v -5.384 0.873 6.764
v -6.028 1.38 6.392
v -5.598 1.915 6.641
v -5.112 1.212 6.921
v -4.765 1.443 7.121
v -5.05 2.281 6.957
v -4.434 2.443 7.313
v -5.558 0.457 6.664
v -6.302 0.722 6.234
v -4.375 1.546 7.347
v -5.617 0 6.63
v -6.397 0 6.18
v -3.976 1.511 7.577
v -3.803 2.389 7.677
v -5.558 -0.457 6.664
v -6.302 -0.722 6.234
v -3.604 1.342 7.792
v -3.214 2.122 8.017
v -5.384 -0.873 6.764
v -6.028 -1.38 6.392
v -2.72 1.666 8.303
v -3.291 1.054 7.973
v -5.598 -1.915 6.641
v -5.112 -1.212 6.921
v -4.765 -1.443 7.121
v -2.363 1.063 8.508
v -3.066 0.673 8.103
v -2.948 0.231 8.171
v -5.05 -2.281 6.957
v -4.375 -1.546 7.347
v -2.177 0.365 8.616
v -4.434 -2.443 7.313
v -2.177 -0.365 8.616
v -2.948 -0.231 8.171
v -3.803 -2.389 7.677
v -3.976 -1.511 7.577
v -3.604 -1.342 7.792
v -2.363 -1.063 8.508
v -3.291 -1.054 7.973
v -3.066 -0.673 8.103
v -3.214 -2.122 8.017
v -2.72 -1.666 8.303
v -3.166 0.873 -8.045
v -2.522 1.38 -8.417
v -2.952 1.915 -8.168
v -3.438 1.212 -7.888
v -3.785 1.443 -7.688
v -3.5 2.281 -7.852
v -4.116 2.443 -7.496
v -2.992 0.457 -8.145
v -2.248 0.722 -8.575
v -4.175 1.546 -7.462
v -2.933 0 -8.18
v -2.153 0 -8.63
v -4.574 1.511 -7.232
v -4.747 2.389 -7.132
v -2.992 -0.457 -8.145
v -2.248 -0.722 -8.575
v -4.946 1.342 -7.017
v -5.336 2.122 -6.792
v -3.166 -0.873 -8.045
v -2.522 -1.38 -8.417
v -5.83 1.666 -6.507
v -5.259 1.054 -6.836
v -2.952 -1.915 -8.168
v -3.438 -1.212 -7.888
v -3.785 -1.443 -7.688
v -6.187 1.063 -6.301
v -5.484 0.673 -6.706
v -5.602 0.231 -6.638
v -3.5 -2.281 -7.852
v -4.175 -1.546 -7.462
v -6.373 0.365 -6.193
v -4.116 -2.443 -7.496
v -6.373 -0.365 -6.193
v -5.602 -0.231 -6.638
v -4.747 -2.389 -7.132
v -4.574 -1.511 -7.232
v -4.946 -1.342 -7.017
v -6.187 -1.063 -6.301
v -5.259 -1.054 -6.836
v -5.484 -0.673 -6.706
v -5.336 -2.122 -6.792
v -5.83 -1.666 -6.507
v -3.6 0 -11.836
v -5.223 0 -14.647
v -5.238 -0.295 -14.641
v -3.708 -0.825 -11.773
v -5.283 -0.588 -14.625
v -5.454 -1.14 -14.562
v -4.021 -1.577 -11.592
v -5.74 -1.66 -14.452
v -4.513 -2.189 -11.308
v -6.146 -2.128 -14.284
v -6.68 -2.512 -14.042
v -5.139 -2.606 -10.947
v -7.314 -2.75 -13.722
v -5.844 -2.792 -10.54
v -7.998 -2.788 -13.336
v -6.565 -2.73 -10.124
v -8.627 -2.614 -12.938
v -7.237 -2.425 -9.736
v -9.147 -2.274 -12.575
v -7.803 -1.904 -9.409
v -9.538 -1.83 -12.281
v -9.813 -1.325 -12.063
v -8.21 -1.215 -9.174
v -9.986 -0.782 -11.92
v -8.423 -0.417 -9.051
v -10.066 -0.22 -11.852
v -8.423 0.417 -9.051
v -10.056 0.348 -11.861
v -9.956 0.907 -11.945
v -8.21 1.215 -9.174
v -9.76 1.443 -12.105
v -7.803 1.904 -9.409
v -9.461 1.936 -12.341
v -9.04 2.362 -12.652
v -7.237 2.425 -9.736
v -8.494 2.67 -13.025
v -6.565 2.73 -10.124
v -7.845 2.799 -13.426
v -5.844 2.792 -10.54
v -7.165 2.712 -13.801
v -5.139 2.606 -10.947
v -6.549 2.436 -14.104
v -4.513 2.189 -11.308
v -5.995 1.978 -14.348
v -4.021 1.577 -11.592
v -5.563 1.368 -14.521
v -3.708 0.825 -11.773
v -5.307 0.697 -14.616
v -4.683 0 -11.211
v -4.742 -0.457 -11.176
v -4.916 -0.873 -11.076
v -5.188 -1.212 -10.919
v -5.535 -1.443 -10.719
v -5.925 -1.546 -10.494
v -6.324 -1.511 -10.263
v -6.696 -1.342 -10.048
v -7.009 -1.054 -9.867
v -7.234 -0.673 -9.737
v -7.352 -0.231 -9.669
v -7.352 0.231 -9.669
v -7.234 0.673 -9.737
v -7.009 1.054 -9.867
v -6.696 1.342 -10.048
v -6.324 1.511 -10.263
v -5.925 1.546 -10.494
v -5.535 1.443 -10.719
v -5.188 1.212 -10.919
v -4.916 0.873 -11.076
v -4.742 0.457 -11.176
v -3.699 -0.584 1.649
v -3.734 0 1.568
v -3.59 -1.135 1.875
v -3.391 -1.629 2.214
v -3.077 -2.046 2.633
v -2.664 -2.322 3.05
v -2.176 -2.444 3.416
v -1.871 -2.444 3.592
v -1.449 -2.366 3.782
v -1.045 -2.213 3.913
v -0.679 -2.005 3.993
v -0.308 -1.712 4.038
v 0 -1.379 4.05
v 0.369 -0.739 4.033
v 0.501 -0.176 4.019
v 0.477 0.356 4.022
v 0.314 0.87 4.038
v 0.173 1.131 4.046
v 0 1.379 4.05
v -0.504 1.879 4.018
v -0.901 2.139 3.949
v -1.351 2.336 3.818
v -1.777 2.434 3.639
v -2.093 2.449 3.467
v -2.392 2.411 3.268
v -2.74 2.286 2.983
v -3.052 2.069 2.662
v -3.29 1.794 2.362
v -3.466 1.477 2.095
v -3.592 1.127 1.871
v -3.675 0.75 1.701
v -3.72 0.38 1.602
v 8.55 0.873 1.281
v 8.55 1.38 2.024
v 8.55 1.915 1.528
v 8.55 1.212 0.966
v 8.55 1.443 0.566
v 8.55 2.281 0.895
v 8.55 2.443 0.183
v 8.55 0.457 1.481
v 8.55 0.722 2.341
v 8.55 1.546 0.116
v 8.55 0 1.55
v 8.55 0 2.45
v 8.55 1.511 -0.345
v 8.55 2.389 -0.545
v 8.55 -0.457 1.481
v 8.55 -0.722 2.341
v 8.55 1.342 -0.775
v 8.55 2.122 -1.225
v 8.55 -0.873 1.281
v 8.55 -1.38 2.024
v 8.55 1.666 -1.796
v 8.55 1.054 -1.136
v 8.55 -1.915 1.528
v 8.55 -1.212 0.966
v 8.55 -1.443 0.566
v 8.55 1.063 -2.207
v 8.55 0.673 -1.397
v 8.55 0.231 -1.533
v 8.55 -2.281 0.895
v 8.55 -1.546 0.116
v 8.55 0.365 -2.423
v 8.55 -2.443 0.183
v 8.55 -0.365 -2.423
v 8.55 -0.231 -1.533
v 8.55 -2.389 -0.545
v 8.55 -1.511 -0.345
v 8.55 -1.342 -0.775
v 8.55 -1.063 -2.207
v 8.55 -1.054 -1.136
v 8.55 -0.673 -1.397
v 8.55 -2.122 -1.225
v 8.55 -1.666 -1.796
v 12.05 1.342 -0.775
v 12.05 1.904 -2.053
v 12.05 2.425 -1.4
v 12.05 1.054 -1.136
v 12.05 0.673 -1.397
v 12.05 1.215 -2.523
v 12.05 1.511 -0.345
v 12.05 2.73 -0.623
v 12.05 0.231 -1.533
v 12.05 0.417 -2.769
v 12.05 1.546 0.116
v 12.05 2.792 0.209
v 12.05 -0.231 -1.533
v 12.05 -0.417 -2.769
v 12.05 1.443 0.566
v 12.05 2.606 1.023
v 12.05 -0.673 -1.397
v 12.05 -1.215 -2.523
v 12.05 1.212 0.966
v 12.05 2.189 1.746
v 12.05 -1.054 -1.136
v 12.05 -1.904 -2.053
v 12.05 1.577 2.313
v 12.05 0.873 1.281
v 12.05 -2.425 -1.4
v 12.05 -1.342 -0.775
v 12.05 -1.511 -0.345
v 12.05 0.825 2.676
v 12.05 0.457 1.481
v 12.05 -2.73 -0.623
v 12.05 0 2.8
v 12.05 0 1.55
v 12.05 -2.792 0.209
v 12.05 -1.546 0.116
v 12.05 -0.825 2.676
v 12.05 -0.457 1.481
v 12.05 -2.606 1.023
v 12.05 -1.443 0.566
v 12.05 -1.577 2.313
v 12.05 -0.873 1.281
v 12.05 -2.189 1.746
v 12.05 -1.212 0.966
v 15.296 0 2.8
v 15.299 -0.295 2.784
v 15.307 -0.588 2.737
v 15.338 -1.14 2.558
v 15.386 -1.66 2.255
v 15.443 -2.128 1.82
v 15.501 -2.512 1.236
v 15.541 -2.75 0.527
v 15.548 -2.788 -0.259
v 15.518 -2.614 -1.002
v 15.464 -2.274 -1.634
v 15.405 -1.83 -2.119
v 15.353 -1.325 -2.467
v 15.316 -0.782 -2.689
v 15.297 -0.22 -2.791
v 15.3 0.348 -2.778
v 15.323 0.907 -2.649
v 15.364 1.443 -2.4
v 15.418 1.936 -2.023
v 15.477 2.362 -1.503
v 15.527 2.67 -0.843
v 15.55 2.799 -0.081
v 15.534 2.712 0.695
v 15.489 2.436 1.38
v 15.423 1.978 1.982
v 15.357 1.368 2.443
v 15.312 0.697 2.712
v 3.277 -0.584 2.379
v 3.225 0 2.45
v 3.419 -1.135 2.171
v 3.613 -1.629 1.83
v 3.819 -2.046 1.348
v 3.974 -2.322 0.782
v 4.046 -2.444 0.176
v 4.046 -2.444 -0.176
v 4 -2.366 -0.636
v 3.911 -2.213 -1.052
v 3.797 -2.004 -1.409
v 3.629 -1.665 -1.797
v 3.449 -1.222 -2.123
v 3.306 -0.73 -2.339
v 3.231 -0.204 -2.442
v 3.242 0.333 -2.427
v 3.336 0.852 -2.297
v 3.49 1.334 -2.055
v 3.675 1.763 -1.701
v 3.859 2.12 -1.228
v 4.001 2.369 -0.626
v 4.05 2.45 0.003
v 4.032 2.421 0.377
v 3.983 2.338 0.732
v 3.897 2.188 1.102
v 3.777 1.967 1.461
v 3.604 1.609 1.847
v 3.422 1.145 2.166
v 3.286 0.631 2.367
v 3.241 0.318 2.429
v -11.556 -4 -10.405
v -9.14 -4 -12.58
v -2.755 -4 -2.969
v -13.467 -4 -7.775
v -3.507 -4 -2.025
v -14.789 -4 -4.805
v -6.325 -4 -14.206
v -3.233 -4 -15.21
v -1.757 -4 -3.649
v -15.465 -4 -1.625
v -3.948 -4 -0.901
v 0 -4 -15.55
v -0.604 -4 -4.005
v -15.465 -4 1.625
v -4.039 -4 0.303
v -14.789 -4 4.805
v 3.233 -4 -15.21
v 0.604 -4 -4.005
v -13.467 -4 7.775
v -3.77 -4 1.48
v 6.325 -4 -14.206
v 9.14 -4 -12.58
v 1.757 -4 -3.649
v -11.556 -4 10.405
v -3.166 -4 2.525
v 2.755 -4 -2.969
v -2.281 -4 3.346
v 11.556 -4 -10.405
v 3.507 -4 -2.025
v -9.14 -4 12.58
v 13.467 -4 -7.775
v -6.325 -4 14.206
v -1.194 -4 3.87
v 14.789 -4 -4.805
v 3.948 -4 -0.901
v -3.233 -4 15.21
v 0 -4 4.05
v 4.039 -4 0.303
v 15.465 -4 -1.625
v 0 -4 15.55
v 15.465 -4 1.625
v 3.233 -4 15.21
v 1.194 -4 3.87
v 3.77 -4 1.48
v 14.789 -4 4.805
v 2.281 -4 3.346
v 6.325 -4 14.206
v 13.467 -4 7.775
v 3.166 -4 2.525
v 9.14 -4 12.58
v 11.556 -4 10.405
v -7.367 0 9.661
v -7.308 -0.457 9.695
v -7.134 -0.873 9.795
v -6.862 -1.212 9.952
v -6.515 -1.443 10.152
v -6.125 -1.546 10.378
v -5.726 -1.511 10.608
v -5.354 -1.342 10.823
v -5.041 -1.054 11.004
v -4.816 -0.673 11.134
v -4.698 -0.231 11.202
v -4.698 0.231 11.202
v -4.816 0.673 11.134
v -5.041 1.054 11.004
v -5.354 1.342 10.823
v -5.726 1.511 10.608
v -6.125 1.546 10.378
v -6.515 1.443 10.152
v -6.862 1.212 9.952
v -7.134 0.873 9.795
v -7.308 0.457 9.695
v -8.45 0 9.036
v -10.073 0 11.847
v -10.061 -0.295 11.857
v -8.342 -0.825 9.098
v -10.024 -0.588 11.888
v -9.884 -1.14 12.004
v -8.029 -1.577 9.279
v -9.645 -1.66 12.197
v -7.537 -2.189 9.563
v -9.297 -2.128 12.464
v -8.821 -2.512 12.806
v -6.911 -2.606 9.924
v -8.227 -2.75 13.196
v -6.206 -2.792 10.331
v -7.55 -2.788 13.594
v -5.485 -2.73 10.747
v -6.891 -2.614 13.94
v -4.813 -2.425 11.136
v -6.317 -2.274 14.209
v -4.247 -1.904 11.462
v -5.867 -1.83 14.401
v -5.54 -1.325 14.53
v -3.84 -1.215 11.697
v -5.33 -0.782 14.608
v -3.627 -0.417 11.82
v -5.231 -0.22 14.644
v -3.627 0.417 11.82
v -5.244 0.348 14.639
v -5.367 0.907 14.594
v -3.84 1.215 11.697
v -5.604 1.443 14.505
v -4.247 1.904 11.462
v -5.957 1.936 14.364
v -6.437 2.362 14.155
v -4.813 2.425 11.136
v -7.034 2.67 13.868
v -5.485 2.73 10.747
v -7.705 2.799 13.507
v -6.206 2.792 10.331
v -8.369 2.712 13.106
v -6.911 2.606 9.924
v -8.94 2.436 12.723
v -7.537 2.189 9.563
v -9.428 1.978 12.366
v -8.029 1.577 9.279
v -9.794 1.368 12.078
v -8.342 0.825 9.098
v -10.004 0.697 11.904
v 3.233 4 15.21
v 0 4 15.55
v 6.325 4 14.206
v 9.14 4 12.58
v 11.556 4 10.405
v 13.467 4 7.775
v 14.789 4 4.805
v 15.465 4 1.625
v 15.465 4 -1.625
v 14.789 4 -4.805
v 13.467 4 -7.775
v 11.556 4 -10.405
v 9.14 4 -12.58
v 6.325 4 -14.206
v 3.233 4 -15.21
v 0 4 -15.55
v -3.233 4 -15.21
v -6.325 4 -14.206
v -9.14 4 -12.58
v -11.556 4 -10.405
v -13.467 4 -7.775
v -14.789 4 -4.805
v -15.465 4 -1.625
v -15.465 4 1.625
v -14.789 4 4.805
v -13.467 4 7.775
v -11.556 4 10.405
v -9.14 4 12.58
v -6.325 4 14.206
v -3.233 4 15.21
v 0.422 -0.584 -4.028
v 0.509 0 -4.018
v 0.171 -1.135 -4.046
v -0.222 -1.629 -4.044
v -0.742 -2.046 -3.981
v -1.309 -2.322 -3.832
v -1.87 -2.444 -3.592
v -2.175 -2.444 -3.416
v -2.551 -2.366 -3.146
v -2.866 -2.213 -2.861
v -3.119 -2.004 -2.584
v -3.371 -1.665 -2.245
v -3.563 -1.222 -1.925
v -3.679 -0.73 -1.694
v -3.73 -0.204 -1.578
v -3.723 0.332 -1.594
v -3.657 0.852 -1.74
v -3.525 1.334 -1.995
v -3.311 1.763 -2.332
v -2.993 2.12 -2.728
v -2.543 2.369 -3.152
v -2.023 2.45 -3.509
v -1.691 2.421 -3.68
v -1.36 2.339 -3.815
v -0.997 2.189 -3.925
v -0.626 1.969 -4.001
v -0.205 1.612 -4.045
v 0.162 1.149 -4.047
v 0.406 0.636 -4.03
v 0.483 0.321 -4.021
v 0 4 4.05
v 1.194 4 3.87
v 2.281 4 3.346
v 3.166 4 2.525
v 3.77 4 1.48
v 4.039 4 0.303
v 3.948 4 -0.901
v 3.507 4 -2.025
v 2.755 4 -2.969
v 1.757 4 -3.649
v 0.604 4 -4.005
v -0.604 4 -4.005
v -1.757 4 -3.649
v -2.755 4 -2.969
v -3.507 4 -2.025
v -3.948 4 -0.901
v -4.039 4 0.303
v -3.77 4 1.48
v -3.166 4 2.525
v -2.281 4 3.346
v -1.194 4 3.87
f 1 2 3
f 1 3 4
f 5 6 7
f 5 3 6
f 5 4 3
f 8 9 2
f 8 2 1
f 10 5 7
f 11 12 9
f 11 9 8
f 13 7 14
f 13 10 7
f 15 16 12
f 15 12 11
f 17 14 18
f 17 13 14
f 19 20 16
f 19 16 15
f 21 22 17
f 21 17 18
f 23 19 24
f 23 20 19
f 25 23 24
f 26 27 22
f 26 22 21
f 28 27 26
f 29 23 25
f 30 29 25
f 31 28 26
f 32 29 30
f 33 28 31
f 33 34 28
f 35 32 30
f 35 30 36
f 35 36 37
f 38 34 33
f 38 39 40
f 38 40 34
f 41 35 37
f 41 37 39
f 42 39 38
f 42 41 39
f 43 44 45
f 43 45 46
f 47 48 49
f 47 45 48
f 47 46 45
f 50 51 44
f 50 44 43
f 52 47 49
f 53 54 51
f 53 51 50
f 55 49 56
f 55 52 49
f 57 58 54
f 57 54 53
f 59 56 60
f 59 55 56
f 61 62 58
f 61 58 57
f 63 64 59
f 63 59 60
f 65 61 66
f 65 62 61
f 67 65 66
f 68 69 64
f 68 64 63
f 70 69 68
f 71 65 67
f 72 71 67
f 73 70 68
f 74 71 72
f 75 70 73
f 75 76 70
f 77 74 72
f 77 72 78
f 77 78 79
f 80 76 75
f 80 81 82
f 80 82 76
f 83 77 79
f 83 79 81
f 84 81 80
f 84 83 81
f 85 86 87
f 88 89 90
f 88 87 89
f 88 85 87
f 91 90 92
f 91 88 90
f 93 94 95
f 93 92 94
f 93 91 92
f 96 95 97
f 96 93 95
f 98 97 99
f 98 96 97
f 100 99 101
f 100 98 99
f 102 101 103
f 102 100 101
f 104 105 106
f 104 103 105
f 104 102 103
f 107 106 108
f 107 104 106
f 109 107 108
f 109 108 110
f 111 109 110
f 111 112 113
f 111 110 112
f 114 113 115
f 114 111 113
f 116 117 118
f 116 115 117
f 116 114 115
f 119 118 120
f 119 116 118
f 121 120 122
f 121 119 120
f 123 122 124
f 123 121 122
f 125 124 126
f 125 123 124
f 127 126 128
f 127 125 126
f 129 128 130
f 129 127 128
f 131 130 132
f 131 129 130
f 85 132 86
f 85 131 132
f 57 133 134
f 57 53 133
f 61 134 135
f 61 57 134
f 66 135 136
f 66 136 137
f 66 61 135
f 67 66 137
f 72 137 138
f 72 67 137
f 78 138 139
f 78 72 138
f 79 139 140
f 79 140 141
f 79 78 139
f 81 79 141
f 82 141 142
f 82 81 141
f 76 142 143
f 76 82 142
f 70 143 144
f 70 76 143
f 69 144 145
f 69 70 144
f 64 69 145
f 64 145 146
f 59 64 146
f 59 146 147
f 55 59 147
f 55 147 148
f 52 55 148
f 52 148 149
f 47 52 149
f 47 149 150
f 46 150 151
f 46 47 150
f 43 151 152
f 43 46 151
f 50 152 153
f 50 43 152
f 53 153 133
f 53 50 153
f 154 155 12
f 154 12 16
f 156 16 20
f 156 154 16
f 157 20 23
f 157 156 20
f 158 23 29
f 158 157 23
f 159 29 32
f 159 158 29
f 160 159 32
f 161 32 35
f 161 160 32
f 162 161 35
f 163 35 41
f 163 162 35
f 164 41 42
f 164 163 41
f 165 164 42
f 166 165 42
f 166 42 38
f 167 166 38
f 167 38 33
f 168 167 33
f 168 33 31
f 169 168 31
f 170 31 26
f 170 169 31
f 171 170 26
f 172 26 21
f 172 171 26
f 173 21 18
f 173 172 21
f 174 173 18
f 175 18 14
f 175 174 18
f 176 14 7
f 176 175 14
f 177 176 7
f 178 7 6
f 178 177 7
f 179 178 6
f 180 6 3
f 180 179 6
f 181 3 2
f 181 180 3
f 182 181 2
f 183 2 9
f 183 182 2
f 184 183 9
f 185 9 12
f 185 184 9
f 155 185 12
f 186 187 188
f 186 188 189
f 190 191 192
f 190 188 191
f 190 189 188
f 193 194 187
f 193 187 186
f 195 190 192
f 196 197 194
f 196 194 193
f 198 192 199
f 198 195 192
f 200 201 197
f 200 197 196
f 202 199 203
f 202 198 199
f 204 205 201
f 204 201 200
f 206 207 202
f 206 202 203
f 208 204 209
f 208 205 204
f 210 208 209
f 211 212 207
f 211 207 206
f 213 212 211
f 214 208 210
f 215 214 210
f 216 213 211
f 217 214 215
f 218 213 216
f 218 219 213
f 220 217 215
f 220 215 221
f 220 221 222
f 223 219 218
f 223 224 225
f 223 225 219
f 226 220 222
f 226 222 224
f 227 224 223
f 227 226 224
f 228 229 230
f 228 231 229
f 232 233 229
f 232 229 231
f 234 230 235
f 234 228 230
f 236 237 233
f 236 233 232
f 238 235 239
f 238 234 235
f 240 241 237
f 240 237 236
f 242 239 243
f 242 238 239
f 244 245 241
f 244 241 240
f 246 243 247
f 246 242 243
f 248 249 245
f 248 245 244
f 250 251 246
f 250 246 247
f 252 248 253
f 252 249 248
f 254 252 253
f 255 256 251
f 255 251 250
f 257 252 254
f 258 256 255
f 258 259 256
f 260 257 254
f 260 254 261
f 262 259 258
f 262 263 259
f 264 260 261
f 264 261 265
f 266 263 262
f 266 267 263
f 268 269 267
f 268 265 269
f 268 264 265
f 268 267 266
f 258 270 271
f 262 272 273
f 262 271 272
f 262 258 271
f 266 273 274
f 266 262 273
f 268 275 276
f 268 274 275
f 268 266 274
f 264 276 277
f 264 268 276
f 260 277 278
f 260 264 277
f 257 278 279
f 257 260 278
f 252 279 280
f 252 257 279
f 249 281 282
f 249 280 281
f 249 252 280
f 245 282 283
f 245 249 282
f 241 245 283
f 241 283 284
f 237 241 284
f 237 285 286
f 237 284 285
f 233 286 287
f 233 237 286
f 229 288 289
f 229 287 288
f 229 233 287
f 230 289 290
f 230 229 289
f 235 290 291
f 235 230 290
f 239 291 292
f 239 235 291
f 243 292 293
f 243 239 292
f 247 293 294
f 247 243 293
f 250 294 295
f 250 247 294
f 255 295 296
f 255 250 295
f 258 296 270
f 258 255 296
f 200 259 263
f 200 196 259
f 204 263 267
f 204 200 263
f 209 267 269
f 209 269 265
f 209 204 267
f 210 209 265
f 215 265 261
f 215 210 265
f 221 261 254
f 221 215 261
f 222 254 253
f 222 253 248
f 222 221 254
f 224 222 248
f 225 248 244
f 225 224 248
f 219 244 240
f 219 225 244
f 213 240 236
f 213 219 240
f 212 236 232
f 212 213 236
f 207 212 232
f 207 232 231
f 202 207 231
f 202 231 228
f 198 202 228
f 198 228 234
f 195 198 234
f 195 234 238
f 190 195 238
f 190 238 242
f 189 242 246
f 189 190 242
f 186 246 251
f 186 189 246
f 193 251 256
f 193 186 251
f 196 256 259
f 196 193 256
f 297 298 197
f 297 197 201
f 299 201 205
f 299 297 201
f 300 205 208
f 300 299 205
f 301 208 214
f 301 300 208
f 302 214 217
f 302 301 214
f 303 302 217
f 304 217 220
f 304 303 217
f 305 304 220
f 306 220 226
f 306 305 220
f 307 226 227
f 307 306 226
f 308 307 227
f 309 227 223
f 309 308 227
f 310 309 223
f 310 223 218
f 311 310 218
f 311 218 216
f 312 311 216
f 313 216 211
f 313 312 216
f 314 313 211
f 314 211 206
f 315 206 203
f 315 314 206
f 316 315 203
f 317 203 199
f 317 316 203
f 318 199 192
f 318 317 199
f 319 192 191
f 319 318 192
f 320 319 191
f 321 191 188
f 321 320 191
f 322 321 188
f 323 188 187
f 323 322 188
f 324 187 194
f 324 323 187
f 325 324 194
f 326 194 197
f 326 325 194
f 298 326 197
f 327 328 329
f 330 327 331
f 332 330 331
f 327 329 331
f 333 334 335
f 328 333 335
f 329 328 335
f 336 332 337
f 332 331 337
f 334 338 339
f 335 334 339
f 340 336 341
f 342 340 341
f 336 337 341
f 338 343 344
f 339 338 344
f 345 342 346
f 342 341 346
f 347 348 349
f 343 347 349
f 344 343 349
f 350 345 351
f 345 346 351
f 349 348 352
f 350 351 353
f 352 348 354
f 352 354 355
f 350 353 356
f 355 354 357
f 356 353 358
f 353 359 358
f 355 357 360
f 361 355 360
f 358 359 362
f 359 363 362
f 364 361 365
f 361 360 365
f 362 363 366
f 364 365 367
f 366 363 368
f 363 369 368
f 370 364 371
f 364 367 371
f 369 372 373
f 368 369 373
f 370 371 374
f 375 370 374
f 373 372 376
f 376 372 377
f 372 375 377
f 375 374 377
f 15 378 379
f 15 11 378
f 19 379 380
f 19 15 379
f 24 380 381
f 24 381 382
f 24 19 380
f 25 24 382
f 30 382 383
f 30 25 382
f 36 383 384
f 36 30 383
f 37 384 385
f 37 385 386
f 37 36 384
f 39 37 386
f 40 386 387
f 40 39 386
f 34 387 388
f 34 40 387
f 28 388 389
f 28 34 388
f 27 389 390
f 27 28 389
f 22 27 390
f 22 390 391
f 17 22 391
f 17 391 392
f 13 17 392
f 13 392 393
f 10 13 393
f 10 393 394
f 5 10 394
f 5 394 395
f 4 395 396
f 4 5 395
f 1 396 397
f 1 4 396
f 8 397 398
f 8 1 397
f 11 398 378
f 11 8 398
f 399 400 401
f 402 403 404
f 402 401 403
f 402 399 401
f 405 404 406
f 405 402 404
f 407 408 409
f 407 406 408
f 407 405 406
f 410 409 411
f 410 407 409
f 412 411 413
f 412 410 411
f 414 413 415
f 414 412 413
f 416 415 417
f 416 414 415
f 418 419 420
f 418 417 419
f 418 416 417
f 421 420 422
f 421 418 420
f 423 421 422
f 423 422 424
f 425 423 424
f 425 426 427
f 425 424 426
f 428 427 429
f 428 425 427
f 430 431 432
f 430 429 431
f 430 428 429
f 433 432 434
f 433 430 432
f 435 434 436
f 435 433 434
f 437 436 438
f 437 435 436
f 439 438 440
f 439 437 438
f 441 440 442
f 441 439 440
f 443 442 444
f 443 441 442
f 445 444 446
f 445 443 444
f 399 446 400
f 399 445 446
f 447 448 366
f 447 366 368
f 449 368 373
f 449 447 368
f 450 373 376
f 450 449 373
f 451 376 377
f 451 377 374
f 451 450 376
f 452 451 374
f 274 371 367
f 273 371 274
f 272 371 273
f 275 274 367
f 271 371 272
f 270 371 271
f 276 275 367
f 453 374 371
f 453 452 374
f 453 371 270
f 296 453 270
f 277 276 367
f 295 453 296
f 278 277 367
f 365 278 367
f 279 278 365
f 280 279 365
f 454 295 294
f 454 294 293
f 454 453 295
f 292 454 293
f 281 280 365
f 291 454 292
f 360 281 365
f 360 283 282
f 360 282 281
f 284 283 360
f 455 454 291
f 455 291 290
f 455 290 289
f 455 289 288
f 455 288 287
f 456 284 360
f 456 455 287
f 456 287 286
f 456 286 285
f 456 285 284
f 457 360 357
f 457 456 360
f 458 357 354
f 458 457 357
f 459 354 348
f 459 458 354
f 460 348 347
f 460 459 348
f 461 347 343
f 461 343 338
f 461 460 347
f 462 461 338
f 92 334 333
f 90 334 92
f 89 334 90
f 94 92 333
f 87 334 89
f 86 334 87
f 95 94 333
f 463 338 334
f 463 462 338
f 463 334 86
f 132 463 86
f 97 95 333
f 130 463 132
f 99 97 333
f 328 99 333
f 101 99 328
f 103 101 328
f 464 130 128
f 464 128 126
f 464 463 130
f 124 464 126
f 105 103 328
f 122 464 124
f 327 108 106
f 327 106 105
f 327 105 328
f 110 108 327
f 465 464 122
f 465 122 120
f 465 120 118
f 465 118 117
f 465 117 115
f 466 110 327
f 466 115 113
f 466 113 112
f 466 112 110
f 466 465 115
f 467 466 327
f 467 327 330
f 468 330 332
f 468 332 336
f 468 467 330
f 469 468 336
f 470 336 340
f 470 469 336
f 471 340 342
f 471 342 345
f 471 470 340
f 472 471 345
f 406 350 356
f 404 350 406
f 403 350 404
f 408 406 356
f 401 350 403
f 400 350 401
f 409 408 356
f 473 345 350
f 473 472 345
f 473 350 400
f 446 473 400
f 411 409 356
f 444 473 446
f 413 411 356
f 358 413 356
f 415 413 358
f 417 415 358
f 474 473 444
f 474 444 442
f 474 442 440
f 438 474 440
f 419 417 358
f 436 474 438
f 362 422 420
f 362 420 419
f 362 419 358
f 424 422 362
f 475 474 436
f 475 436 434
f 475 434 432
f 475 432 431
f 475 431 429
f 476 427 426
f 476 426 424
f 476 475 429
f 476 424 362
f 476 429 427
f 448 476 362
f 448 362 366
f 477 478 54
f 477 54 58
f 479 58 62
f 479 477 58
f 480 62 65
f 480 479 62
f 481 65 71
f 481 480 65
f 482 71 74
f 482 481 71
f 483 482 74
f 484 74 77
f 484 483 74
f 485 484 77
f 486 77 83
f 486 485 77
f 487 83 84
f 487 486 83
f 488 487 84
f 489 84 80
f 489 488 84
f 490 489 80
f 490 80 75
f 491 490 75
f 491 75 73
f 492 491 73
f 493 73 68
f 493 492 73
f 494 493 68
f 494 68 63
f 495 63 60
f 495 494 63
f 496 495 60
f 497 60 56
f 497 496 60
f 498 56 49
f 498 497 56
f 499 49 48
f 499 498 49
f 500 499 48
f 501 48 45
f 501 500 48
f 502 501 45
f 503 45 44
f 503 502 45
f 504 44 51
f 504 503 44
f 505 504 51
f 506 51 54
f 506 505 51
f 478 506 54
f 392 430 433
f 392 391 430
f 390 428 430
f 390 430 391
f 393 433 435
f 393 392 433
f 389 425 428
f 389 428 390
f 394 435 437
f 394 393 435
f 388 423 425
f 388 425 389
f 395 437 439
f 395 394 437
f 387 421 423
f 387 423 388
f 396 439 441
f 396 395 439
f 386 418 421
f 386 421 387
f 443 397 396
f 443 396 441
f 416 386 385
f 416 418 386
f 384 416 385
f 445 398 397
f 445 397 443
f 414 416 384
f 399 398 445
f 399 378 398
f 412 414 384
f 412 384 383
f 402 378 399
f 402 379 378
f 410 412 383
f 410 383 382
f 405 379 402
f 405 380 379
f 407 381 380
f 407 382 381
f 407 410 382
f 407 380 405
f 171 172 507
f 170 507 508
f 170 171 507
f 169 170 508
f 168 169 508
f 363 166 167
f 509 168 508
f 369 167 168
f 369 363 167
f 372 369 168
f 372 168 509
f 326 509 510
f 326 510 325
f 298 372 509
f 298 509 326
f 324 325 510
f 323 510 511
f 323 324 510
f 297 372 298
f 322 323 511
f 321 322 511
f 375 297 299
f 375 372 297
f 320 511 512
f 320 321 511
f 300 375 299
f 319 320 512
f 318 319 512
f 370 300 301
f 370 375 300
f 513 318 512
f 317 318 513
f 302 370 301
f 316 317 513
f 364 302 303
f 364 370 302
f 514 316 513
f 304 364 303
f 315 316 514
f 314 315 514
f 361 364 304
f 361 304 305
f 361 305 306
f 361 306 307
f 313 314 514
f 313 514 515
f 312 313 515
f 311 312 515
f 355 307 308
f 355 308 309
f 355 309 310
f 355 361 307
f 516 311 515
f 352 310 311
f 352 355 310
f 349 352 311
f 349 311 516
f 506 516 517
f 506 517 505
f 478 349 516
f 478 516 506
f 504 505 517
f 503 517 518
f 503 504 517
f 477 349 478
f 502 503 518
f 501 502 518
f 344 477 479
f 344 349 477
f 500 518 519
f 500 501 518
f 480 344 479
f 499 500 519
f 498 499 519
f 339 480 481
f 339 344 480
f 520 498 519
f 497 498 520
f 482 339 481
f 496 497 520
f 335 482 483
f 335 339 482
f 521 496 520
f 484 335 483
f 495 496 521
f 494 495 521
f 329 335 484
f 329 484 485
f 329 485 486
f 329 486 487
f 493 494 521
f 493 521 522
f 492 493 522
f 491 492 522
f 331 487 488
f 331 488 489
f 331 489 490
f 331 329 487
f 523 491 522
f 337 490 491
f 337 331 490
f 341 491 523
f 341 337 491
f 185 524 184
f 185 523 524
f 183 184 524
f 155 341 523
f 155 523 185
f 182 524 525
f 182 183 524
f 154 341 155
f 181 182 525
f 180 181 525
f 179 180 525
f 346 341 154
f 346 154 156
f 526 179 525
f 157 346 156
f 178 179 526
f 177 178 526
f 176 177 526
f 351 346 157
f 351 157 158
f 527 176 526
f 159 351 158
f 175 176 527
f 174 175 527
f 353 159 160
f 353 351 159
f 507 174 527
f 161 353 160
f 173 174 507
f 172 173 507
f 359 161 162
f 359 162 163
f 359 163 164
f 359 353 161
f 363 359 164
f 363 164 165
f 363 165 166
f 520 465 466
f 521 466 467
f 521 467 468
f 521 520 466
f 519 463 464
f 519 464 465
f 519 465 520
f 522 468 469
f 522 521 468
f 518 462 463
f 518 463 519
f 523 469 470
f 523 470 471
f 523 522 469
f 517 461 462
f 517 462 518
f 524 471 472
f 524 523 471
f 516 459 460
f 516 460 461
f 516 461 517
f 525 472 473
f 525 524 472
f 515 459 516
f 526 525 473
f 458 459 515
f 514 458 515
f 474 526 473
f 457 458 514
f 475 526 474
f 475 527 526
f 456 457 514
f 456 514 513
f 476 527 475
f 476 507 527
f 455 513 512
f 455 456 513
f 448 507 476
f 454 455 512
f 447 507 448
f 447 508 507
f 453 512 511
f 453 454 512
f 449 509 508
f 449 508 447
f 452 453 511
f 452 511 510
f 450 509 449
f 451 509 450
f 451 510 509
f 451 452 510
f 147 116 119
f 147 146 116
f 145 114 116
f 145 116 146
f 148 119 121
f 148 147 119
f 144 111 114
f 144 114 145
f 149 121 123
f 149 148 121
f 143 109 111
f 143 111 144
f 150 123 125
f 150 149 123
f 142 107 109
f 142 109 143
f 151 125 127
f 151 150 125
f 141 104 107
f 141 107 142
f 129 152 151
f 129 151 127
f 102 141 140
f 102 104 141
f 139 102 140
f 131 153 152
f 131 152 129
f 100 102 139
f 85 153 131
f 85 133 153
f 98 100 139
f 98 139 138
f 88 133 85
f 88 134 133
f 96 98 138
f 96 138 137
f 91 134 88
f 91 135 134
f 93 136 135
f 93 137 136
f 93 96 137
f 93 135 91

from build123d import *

# Parameters (mm, degrees)
SKETCH1_R           = 15.55
SKETCH1_R_2         = 4.05
BOSS_EXTRUDE1_DEPTH = 4
CIRPATTERN1_COUNT   = 3


with BuildPart() as part:
    # Sketch1 → Boss-Extrude1 (new, symmetric)
    with BuildSketch(Plane(origin=(0, 0, 0), x_dir=(1, 0, 0), z_dir=(0, 1, 0))):
        with Locations(Location((0, 0, 0), (0, 0, 270))):
            Circle(SKETCH1_R)
        with Locations(Location((0, 0, 0), (0, 0, 270))):
            Circle(SKETCH1_R_2, mode=Mode.SUBTRACT)
    extrude(amount=BOSS_EXTRUDE1_DEPTH, both=True)

    # Sketch3 → Cut-Revolve1 (revolve, cut)
    with BuildSketch(Plane(origin=(0, 0, 0), x_dir=(1, 0, 0), z_dir=(0, 1, 0)), mode=Mode.PRIVATE) as cut_revolve1_sk:
        Polygon((15.55, 0), (15.55, 2.8), (12.05, 2.8), (12.05, 1.55), (8.55, 1.55), (8.55, 2.45), (1.114592602, 2.45), (1.114592602, 0), align=None)
    cut_revolve1 = revolve(cut_revolve1_sk.sketch.rotate(Axis((0, 0, 0), (1, 0, 0)), 180), axis=Axis((0, 0, 0), (1, 0, 0)), mode=Mode.SUBTRACT)

    # CirPattern1: Cut-Revolve1 ×3 about axis
    cirpattern1_axis = Axis((0, 0, 0), (0, 1, 0))
    for i in range(1, CIRPATTERN1_COUNT):
        add(cut_revolve1.rotate(cirpattern1_axis, i * 360 / CIRPATTERN1_COUNT), mode=Mode.SUBTRACT)


solid = part.part
